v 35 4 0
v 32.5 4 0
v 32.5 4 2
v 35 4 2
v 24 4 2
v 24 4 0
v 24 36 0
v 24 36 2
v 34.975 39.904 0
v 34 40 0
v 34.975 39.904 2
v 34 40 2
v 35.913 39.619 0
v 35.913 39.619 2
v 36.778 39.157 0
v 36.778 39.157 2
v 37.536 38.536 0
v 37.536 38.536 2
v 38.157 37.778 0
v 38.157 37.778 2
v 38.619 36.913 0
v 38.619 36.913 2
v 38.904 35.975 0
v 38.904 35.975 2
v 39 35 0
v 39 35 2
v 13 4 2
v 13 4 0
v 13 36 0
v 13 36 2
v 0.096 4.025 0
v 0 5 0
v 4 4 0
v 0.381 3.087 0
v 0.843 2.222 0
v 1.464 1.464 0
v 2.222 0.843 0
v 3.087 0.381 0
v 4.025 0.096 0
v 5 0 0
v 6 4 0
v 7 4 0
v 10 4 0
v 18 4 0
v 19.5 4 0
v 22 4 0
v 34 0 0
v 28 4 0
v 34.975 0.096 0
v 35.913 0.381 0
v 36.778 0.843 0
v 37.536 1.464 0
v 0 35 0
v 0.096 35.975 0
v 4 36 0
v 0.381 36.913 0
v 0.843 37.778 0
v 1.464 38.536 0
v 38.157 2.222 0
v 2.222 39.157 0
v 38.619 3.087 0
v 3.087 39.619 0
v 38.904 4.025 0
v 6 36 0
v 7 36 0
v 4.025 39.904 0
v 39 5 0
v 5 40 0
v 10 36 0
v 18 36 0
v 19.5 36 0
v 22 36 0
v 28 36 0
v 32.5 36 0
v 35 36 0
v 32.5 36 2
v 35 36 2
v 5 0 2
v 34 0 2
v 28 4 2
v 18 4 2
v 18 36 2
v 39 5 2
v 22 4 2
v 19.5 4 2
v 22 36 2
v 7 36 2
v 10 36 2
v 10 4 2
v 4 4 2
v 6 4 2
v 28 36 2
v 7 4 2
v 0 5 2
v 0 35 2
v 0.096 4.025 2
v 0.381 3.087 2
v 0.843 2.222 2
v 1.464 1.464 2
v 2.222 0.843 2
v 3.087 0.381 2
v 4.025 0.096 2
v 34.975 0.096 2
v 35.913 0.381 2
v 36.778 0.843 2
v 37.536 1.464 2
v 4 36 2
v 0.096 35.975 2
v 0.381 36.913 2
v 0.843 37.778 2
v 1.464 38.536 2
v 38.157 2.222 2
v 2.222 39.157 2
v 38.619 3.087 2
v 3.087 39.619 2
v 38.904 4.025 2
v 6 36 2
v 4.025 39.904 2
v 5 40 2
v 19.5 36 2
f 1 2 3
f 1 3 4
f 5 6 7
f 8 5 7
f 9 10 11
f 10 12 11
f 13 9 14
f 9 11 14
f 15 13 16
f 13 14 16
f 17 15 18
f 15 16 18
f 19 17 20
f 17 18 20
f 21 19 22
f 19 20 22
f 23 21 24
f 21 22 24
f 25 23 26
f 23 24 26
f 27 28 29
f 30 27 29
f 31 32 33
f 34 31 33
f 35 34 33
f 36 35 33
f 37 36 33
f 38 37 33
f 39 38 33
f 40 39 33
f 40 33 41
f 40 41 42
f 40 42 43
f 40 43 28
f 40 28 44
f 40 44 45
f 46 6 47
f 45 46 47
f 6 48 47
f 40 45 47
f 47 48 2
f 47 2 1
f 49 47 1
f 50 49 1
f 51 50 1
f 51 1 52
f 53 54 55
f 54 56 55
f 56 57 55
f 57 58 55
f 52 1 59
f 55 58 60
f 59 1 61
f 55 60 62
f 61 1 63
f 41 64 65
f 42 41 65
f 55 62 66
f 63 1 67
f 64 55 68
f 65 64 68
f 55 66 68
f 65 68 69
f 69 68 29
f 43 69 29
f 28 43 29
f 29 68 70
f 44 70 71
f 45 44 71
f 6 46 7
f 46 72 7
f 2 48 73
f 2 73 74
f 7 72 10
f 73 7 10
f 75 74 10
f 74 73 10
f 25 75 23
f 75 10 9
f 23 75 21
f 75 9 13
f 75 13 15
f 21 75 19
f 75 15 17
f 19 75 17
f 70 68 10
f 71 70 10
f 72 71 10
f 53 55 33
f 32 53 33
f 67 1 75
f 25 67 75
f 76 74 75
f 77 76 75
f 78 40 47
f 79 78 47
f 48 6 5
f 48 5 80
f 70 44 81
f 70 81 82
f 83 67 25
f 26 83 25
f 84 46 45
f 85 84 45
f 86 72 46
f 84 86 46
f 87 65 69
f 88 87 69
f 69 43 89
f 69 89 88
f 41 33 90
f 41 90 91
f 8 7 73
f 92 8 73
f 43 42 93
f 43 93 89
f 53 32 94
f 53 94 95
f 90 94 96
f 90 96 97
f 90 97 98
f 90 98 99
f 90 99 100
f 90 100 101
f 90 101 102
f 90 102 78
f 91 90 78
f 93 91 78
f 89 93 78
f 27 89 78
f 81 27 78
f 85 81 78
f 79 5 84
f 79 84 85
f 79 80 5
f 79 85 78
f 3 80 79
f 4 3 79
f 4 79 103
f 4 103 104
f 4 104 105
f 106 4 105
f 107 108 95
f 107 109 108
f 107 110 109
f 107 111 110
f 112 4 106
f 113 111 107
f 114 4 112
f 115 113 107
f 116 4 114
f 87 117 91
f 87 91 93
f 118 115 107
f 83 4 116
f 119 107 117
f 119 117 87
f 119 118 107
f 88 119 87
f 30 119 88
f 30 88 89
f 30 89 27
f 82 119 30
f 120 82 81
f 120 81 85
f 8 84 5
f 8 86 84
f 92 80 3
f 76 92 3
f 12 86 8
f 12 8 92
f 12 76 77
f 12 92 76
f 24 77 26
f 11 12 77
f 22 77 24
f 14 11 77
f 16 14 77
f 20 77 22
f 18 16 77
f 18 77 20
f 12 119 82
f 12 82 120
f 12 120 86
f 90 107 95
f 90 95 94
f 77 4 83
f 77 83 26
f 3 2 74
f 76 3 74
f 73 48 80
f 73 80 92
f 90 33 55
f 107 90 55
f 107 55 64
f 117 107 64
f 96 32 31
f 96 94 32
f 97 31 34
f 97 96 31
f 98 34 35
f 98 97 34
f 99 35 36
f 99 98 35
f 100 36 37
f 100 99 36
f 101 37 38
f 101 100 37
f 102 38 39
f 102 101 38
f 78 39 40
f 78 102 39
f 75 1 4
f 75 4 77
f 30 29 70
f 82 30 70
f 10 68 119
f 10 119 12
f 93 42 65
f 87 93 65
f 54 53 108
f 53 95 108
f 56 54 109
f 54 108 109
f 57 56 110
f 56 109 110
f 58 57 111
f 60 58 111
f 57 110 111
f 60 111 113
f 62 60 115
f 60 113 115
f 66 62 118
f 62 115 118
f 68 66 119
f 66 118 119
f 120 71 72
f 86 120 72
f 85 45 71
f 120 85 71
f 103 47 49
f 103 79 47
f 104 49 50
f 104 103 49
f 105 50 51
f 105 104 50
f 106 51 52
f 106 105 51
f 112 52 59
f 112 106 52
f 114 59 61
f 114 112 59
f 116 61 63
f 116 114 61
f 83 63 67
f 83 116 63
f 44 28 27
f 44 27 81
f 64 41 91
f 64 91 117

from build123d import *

# Parameters (mm, degrees)
F0_W     = 39
F0_H     = 40
F0_W_2   = 2
F0_H_2   = 32
F0_W_3   = 3
F0_W_4   = 5
F0_W_5   = 4
F0_W_6   = 2.5
F1_DEPTH = 2
F2_R     = 5


with BuildPart() as f1:
    # F0 (on Top) → F1 (new body)
    with BuildSketch(Plane.XY):
        with Locations((19.5, 20)):
            Rectangle(F0_W, F0_H)
        with Locations((5, 20)):
            Rectangle(F0_W_2, F0_H_2, mode=Mode.SUBTRACT)
        with Locations((8.5, 20)):
            Rectangle(F0_W_3, F0_H_2, mode=Mode.SUBTRACT)
        with Locations((15.5, 20)):
            Rectangle(F0_W_4, F0_H_2, mode=Mode.SUBTRACT)
        Polygon((22, 4), (21, 4), (19.5, 4), (19.5, 36), (21, 36), (22, 36), align=None, mode=Mode.SUBTRACT)
        with Locations((26, 20)):
            Rectangle(F0_W_5, F0_H_2, mode=Mode.SUBTRACT)
        with Locations((33.75, 20)):
            Rectangle(F0_W_6, F0_H_2, mode=Mode.SUBTRACT)
    extrude(amount=F1_DEPTH)

    # F2
    f2_edges = [f1.edges().sort_by_distance(p)[0] for p in [
        (39, 40, 1),
        (39, 0, 1),
        (0, 0, 1),
        (0, 40, 1),
    ]]
    fillet(f2_edges, radius=F2_R)


solid = f1.part
